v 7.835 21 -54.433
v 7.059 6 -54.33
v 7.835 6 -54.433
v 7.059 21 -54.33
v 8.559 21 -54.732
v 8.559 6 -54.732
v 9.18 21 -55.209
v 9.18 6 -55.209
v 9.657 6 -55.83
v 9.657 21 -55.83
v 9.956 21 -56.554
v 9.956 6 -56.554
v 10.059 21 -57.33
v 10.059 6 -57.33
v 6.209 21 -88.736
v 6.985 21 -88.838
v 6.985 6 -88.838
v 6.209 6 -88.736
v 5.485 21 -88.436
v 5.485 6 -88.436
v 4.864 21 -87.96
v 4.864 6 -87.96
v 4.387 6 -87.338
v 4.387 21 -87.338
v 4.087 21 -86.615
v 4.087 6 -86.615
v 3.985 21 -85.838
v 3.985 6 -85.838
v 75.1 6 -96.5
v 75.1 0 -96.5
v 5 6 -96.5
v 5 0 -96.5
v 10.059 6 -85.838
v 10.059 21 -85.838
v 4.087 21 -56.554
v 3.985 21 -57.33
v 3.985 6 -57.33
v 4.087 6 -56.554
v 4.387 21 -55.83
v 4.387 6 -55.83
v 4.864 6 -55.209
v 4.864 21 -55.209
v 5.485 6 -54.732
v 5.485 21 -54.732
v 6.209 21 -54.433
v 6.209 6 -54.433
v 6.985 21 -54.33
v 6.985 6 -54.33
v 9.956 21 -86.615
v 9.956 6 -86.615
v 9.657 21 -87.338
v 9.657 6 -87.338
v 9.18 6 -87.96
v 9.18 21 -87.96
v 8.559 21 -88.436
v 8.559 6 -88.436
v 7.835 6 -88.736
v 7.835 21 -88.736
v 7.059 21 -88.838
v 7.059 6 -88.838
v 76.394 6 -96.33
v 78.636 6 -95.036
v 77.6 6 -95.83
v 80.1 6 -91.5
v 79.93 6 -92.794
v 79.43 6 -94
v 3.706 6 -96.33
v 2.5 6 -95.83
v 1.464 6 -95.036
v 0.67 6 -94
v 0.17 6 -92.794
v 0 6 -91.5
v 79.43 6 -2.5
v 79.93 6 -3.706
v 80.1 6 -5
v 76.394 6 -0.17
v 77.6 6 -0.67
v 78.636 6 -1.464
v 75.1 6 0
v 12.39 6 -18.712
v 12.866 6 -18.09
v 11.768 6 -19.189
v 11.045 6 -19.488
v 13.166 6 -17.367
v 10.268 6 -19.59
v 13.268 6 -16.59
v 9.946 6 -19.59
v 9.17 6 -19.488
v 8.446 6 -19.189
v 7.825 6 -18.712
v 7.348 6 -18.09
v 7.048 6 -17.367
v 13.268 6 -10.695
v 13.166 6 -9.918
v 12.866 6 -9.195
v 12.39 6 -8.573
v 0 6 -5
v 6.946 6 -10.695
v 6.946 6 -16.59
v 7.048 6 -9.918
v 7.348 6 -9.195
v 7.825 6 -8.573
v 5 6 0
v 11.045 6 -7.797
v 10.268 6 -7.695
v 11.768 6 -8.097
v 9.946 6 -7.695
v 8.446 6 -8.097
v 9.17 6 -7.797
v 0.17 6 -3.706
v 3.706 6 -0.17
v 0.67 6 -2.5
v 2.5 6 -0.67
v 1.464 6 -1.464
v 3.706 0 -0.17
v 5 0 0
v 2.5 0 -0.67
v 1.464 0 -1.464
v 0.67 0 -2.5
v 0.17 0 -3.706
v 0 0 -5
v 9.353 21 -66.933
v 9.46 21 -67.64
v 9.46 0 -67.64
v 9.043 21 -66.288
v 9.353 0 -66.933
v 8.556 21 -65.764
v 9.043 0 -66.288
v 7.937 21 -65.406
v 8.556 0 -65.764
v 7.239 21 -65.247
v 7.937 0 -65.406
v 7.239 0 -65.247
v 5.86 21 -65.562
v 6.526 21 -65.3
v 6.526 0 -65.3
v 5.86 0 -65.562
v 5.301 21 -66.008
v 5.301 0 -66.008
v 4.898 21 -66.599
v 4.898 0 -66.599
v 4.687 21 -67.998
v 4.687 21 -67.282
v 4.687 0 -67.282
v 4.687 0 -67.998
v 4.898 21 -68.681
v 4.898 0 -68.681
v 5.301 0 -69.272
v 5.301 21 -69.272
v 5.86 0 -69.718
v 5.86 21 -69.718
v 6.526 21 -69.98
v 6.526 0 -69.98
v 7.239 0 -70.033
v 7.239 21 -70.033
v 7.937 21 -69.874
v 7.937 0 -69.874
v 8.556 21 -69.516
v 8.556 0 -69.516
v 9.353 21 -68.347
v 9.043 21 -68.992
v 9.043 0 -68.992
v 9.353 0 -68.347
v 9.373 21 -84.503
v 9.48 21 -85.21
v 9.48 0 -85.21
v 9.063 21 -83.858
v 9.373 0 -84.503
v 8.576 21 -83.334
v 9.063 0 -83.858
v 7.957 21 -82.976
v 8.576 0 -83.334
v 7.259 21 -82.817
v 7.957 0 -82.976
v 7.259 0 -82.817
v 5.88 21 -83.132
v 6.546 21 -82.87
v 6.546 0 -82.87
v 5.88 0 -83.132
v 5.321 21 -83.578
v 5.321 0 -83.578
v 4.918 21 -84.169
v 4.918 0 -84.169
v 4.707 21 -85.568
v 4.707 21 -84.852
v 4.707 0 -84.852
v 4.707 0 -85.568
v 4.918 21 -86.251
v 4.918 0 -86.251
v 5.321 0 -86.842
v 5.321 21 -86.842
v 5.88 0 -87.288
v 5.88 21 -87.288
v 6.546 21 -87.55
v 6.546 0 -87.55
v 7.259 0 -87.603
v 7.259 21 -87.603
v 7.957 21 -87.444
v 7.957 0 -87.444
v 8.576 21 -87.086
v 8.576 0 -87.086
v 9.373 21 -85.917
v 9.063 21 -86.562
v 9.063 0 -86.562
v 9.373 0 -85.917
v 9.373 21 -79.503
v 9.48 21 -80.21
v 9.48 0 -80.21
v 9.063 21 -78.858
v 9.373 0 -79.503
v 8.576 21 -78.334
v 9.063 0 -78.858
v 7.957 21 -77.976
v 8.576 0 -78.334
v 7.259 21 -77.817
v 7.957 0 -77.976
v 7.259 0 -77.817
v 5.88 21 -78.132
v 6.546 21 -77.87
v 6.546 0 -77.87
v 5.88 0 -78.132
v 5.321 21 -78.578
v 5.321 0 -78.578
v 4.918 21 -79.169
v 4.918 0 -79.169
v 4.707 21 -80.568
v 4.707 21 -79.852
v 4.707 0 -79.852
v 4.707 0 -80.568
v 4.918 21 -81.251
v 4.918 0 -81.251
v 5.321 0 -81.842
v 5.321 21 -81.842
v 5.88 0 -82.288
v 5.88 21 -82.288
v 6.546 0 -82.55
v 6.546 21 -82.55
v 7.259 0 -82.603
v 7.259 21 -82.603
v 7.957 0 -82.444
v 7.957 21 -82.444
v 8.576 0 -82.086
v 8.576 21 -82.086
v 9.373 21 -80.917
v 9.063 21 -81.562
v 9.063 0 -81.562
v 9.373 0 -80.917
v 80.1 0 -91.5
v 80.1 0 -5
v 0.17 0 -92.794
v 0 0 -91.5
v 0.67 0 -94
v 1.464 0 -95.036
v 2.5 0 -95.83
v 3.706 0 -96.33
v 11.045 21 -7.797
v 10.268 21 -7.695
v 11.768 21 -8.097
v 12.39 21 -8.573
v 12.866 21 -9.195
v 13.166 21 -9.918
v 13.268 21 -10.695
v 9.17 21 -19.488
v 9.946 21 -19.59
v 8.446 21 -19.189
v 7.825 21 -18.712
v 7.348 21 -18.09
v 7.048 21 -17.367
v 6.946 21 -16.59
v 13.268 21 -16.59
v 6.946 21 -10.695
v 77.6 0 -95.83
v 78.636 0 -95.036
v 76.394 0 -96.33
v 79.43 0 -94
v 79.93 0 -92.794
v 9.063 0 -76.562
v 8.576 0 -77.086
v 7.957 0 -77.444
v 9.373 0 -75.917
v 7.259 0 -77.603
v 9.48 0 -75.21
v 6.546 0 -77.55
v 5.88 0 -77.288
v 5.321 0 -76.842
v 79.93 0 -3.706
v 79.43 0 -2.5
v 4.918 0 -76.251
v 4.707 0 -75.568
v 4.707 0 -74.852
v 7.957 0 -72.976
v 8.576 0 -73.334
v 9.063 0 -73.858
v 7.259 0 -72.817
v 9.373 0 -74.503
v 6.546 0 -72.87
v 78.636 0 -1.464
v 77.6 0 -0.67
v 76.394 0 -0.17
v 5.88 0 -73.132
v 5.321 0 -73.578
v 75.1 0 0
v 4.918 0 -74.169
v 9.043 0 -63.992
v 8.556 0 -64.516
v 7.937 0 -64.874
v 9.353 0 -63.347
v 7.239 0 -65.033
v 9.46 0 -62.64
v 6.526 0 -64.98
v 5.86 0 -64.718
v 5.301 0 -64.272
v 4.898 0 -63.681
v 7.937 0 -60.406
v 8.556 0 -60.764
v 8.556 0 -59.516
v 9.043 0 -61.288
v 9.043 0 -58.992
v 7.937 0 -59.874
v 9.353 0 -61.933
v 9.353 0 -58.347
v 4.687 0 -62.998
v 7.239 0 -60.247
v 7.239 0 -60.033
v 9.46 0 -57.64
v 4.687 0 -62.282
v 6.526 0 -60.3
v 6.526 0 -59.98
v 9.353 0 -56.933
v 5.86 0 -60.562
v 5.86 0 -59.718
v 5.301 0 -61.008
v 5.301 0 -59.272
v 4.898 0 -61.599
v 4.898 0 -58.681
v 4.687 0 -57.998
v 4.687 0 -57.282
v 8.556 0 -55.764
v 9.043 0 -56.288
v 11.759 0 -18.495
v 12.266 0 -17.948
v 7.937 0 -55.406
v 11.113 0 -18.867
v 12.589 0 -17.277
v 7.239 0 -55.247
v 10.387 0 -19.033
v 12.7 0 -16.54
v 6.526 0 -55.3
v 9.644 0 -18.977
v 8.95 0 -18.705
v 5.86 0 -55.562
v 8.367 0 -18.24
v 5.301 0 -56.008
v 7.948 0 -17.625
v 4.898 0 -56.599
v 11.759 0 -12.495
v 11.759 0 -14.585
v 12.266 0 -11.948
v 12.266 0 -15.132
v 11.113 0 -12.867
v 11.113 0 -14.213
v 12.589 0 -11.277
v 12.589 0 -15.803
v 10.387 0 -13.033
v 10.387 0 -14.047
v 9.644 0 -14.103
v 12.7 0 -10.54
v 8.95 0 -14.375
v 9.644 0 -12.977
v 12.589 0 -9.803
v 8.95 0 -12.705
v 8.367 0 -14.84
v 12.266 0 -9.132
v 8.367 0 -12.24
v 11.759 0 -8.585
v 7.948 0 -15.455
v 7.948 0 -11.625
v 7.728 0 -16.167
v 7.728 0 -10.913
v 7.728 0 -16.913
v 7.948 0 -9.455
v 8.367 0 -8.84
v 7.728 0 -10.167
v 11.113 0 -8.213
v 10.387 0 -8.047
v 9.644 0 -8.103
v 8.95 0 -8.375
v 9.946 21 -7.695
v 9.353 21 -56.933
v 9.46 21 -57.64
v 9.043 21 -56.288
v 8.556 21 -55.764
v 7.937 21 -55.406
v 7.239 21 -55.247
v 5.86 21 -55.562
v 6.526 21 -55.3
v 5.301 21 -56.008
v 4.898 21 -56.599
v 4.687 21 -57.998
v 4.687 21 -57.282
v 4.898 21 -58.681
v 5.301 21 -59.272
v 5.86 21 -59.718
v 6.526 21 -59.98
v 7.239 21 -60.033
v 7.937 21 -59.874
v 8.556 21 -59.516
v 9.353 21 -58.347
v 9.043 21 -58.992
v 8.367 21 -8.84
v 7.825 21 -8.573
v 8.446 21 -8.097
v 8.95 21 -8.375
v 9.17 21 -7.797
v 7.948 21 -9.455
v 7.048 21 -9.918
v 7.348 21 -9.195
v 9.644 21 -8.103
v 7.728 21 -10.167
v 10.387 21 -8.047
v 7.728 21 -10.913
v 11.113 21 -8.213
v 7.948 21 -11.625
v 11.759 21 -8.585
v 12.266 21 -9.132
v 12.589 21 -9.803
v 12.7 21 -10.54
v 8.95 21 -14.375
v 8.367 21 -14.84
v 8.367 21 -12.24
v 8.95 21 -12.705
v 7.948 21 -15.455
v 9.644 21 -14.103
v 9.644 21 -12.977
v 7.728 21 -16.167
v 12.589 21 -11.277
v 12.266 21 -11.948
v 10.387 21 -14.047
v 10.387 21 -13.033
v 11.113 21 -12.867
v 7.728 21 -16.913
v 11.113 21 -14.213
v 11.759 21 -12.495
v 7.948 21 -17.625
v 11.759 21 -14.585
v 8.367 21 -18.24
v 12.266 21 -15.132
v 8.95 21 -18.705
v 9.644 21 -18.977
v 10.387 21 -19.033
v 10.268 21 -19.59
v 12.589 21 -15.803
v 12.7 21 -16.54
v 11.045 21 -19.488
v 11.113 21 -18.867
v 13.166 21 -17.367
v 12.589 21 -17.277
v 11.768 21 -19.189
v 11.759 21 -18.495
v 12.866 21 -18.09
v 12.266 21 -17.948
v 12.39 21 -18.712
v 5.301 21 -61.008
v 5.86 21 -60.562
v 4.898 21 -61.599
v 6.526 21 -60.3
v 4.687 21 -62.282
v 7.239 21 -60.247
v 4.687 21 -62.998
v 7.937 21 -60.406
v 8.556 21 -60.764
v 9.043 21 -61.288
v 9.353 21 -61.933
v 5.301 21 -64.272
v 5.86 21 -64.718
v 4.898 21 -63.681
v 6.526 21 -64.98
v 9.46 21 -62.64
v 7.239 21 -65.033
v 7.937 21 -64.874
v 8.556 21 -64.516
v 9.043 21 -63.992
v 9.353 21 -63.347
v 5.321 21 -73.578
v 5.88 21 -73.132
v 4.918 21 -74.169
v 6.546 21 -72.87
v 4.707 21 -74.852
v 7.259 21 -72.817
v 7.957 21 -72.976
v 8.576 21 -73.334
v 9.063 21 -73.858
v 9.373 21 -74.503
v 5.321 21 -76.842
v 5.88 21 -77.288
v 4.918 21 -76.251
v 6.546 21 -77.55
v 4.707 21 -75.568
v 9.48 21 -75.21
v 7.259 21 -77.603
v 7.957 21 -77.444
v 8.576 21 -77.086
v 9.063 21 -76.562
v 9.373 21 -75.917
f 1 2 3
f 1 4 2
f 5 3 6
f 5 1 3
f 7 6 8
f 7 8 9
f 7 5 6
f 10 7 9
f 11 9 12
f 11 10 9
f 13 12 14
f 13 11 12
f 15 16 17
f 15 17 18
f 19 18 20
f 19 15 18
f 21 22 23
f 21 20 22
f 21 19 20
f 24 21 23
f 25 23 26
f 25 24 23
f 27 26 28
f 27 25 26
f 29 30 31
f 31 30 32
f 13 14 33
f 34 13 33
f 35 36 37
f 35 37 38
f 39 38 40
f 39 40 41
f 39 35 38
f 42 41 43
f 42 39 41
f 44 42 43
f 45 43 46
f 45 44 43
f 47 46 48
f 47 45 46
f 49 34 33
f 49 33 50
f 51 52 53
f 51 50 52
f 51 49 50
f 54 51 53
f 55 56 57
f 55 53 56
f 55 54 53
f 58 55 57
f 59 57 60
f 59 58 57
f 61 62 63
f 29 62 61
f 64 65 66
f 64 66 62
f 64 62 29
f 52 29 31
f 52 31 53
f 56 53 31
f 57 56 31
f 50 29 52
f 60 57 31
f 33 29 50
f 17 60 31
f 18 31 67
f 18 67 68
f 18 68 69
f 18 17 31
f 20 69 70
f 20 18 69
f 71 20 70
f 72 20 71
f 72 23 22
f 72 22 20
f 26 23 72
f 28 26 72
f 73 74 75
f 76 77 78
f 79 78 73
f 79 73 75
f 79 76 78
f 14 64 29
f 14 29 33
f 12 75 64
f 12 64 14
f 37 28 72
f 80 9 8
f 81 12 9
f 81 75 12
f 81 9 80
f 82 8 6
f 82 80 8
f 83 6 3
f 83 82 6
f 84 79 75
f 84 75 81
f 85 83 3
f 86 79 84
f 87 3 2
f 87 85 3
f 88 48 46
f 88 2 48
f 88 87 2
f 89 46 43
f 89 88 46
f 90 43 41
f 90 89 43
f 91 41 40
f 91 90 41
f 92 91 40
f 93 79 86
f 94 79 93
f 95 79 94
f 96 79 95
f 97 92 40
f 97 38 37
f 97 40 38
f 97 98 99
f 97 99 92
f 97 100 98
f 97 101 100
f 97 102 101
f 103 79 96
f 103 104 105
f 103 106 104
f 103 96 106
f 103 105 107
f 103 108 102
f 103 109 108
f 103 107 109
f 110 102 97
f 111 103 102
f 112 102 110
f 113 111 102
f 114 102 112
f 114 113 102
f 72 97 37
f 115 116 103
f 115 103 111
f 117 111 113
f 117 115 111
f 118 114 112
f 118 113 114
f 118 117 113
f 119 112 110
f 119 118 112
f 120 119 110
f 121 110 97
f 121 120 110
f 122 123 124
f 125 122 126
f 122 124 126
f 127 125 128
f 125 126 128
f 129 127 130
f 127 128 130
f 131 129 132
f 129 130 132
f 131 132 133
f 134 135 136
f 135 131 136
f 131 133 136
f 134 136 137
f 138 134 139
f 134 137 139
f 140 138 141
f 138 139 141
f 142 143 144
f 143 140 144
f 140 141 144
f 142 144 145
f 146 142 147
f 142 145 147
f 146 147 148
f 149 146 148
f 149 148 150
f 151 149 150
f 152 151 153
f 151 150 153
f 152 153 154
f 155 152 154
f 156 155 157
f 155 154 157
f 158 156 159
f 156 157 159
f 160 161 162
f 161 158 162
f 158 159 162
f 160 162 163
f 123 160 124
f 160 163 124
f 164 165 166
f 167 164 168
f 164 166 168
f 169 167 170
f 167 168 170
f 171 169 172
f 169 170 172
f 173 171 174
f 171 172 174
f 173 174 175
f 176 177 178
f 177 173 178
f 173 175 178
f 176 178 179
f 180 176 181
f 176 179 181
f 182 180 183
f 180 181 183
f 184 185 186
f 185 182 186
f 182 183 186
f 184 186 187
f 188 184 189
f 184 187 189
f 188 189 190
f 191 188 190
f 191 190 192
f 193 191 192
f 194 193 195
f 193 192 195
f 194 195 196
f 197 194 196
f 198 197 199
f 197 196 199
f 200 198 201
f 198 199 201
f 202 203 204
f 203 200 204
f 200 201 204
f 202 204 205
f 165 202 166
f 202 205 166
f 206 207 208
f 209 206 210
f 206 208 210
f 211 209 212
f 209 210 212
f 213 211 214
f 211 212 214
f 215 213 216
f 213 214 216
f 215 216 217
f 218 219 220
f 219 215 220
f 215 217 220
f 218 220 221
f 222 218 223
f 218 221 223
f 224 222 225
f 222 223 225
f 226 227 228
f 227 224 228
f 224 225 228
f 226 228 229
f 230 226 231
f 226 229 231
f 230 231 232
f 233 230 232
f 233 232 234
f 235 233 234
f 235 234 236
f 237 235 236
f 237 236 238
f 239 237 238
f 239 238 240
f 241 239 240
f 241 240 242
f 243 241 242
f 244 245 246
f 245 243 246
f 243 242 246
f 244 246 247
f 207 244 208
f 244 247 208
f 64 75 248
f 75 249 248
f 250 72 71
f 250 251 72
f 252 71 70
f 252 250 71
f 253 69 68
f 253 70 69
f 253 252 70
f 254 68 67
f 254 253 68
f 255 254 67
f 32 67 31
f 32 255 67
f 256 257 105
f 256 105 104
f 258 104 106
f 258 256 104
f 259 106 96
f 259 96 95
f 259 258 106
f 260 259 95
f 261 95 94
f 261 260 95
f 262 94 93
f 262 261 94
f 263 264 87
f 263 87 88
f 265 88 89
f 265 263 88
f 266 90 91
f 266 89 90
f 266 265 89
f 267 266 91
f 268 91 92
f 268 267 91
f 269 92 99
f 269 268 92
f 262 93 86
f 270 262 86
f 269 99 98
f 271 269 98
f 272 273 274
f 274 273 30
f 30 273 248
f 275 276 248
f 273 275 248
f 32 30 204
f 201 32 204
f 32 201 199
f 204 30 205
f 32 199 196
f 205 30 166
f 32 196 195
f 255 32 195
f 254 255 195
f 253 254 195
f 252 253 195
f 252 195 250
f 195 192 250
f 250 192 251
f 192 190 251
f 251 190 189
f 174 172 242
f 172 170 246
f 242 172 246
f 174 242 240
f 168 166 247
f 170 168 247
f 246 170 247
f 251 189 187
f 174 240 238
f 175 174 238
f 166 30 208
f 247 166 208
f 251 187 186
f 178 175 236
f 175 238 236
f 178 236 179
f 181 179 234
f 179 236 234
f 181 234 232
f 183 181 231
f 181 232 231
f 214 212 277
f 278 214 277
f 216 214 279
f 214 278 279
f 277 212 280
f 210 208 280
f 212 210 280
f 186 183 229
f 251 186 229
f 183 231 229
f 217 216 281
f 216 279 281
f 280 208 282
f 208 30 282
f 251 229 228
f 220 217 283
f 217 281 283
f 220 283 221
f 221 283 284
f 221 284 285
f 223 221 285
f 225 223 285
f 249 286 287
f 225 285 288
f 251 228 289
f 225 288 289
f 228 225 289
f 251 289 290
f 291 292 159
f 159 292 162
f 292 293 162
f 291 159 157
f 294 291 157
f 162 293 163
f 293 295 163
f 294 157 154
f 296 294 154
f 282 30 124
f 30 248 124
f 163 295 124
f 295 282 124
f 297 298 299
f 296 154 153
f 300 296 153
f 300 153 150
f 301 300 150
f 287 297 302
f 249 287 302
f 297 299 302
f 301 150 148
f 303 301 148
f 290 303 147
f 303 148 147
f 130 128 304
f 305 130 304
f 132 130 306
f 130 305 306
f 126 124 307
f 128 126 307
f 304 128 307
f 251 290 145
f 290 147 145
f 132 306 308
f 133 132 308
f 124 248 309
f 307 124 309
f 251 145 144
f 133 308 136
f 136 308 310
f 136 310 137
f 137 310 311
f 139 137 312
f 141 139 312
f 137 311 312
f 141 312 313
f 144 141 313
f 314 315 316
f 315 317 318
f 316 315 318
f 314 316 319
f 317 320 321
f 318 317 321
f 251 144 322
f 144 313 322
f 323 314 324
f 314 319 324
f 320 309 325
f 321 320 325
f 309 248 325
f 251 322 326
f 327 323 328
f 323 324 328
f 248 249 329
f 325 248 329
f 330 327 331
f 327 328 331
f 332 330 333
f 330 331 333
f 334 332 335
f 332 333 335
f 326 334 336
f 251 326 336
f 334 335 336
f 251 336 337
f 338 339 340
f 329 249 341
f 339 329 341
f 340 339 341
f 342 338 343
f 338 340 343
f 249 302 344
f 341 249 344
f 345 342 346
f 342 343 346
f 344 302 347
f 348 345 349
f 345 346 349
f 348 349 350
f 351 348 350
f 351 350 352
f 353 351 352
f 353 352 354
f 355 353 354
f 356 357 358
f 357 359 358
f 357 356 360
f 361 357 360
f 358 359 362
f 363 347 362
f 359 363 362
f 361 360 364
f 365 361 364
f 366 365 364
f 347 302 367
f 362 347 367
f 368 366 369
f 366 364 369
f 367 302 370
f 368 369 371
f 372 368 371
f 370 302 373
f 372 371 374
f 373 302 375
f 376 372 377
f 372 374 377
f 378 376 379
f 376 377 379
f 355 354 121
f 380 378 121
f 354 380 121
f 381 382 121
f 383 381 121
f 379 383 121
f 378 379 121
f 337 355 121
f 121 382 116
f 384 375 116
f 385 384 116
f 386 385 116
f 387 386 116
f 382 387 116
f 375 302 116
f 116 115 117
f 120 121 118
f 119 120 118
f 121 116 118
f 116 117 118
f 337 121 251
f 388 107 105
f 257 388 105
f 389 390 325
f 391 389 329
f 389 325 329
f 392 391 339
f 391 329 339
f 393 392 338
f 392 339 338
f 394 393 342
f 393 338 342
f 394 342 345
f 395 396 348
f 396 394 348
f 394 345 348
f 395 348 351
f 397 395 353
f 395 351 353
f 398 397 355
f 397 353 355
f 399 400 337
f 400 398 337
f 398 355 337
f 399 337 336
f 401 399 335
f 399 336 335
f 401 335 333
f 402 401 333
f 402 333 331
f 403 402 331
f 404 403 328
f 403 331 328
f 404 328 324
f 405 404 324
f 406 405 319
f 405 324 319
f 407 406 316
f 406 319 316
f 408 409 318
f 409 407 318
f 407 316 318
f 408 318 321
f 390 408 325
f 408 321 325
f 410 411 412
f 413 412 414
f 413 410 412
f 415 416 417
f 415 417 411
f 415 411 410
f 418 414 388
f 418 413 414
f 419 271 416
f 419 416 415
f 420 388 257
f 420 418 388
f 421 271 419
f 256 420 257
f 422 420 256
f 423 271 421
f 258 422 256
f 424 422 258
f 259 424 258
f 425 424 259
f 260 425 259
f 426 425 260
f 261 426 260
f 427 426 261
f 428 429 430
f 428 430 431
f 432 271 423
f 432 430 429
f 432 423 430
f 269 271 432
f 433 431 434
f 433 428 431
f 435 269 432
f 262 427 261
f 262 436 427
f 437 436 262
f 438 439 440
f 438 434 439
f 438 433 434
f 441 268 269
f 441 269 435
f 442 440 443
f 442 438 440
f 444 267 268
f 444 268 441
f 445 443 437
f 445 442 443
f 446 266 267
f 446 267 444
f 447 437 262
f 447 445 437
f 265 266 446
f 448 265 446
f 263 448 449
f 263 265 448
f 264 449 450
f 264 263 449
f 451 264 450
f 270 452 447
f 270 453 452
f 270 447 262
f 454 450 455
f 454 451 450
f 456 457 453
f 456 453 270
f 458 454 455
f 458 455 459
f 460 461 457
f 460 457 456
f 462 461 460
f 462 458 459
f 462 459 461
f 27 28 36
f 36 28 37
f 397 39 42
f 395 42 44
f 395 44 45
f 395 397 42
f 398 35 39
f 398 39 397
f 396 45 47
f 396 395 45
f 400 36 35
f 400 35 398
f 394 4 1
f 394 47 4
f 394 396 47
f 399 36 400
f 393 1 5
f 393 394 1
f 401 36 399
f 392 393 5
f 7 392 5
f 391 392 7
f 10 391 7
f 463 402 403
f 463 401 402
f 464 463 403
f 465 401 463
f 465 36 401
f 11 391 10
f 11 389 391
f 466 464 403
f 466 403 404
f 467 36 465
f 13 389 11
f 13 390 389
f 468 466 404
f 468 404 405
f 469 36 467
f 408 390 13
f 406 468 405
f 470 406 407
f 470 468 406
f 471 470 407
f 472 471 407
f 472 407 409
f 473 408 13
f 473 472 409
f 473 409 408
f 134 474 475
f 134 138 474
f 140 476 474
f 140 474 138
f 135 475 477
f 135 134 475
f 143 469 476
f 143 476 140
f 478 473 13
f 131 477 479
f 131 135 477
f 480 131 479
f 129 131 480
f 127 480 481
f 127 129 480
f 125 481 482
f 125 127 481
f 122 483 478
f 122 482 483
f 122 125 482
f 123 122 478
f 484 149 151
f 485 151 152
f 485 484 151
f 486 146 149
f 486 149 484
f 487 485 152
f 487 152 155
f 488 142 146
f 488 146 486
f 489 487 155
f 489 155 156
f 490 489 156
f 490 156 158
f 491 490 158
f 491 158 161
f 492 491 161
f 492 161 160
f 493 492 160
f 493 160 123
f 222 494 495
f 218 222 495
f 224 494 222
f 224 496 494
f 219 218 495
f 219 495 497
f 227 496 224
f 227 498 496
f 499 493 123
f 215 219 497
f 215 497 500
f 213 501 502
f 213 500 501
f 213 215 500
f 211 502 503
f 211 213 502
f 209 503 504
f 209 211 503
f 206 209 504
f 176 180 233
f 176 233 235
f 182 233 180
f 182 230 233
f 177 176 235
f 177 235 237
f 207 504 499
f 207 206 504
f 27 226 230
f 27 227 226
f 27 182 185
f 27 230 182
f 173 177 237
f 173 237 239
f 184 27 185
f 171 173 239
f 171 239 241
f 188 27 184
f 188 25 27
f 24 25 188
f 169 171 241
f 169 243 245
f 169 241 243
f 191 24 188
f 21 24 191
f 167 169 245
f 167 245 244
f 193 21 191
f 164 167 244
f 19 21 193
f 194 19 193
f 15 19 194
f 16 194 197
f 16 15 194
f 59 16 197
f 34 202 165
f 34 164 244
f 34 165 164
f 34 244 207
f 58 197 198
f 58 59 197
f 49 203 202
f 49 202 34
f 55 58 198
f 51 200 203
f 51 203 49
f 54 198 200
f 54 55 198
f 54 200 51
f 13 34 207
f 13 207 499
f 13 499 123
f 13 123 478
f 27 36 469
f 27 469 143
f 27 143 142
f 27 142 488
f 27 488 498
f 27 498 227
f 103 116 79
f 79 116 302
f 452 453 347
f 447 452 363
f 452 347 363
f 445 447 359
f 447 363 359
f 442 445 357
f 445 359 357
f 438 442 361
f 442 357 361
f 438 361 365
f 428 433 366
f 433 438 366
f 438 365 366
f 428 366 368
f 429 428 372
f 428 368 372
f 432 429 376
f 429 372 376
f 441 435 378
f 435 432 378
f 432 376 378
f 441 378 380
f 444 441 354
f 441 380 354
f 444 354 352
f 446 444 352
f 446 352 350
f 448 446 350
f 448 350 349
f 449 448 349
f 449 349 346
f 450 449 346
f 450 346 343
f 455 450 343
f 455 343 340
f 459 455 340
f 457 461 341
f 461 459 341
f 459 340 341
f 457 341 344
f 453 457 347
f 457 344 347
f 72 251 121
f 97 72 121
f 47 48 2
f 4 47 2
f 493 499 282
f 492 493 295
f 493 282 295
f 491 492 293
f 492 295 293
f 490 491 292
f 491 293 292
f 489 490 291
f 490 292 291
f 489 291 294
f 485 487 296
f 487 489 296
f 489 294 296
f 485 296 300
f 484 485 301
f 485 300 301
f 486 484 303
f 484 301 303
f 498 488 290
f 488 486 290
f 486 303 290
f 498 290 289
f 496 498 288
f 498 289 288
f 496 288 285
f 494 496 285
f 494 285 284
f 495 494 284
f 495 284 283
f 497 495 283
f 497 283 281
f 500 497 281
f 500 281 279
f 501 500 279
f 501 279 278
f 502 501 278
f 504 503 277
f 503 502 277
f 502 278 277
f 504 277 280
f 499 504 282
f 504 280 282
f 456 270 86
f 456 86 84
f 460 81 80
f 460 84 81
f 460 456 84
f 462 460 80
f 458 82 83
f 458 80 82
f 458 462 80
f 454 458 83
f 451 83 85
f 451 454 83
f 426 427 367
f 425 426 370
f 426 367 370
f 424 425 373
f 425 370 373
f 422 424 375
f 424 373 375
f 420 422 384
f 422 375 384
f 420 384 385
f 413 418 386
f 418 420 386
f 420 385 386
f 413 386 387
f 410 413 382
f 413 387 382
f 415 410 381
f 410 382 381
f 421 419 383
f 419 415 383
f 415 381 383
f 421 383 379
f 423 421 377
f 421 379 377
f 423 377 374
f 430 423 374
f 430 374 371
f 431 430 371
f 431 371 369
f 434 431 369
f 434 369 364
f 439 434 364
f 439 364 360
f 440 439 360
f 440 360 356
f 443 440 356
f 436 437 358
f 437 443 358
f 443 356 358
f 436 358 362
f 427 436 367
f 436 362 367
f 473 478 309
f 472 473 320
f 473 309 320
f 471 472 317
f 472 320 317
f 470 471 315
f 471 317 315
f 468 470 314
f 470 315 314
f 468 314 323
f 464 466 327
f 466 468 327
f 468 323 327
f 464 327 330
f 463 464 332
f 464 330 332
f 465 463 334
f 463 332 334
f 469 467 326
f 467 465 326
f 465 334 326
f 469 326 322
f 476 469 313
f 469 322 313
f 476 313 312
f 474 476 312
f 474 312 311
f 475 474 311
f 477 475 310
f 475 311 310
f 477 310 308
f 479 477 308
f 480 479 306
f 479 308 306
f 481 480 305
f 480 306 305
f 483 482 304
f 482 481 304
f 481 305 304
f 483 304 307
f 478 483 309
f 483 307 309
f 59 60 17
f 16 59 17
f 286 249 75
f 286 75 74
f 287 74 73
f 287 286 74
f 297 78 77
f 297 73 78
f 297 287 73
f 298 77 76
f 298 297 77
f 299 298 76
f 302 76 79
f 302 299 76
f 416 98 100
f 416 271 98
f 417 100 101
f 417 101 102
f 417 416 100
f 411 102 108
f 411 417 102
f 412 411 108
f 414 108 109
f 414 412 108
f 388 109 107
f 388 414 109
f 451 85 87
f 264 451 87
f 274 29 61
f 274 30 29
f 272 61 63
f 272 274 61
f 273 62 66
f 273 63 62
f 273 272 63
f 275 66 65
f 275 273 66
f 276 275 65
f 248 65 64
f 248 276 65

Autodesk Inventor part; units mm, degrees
ref_plane "YZ Plane" through (0, 0, 0) normal (1, 0, 0) x (0, 1, 0)
ref_plane "XZ Plane" through (0, 0, 0) normal (0, 1, 0) x (-1, 0, 0)
ref_plane "XY Plane" through (0, 0, 0) normal (0, 0, 1) x (1, 0, 0)
sketch "Boceto1" plane through (0, 0, 0) normal (0, 1, 0) x (-1, 0, 0)
  line L0 (-5, 0) -> (-75.1, 0)
  line L1 (-80.1, -5) -> (-80.1, -91.5)
  line L2 (-75.1, -96.5) -> (-5, -96.5)
  line L3 (0, -91.5) -> (0, -5)
  arc A0 (0, -5) -> (-5, 0) centre (-5, -5) ccw
  arc A1 (-75.1, 0) -> (-80.1, -5) centre (-75.1, -5) ccw
  arc A2 (-80.1, -91.5) -> (-75.1, -96.5) centre (-75.1, -91.5) ccw
  arc A3 (-5, -96.5) -> (0, -91.5) centre (-5, -91.5) ccw
  point P0 (0, 0)
  point P1 (-80.1, -96.5)
  point P2 (-80.1, 0)
  point P3 (0, -96.5)
  dimension "d0" = 96.5
  dimension "d1" = 80.1
  dimension "d2" = 5
extrude "Extrusión1" add sketch "Boceto1" along normal blind 6
sketch "Boceto2" plane through (0, 0, 0) normal (0, -1, 0) x (1, 0, 0)
  circle A0 centre (10.2, -10.54) radius 2.5
  circle A1 centre (10.2, -16.54) radius 2.5
  circle A2 centre (7.06, -57.64) radius 2.4
  circle A3 centre (7.06, -62.64) radius 2.4
  circle A4 centre (7.06, -67.64) radius 2.4
  circle A5 centre (7.08, -75.21) radius 2.4
  circle A6 centre (7.08, -80.21) radius 2.4
  circle A7 centre (7.08, -85.21) radius 2.4
  point P0 (0, 0)
extrude "Extrusión2" cut sketch "Boceto2" against normal blind 10
sketch "Boceto3" plane through (0, 6, 0) normal (0, 1, 0) x (1, 0, 0)
  line L0 (6.9461, 7.6948) -> (13.2683, 7.6948)
  line L1 (13.2683, 7.6948) -> (13.2683, 19.5905)
  line L2 (13.2683, 19.5905) -> (6.9461, 19.5905)
  line L3 (6.9461, 19.5905) -> (6.9461, 7.6948)
  circle A0 centre (10.2, 16.54) radius 2.5 projected
  circle A1 centre (10.2, 10.54) radius 2.5 projected
  point P0 (0, 0)
extrude "Extrusión3" add sketch "Boceto3" along normal blind 15
fillet "Empalme1" radius 3 4 edges at (6.9461, 13.5, -19.5905) (6.9461, 13.5, -7.6948) (13.2683, 13.5, -7.6948) (13.2683, 13.5, -19.5905)
sketch "Boceto4" plane through (0, 6, 0) normal (0, 1, 0) x (1, 0, 0)
  line L0 (3.9852, 54.3304) -> (10.0586, 54.3304)
  line L1 (10.0586, 54.3304) -> (10.0586, 88.8384)
  line L2 (10.0586, 88.8384) -> (3.9852, 88.8384)
  line L3 (3.9852, 88.8384) -> (3.9852, 54.3304)
  circle A0 centre (7.06, 57.64) radius 2.4 projected
  circle A1 centre (7.06, 62.64) radius 2.4 projected
  circle A2 centre (7.06, 67.64) radius 2.4 projected
  circle A3 centre (7.08, 75.21) radius 2.4 projected
  circle A4 centre (7.08, 80.21) radius 2.4 projected
  circle A5 centre (7.08, 85.21) radius 2.4 projected
  point P0 (0, 0)
extrude "Extrusión4" add sketch "Boceto4" along normal blind 15
fillet "Empalme2" radius 3 4 edges at (3.9852, 13.5, -54.3304) (3.9852, 13.5, -88.8384) (10.0586, 13.5, -88.8384) (10.0586, 13.5, -54.3304)
properties part number "Tapa Case"
